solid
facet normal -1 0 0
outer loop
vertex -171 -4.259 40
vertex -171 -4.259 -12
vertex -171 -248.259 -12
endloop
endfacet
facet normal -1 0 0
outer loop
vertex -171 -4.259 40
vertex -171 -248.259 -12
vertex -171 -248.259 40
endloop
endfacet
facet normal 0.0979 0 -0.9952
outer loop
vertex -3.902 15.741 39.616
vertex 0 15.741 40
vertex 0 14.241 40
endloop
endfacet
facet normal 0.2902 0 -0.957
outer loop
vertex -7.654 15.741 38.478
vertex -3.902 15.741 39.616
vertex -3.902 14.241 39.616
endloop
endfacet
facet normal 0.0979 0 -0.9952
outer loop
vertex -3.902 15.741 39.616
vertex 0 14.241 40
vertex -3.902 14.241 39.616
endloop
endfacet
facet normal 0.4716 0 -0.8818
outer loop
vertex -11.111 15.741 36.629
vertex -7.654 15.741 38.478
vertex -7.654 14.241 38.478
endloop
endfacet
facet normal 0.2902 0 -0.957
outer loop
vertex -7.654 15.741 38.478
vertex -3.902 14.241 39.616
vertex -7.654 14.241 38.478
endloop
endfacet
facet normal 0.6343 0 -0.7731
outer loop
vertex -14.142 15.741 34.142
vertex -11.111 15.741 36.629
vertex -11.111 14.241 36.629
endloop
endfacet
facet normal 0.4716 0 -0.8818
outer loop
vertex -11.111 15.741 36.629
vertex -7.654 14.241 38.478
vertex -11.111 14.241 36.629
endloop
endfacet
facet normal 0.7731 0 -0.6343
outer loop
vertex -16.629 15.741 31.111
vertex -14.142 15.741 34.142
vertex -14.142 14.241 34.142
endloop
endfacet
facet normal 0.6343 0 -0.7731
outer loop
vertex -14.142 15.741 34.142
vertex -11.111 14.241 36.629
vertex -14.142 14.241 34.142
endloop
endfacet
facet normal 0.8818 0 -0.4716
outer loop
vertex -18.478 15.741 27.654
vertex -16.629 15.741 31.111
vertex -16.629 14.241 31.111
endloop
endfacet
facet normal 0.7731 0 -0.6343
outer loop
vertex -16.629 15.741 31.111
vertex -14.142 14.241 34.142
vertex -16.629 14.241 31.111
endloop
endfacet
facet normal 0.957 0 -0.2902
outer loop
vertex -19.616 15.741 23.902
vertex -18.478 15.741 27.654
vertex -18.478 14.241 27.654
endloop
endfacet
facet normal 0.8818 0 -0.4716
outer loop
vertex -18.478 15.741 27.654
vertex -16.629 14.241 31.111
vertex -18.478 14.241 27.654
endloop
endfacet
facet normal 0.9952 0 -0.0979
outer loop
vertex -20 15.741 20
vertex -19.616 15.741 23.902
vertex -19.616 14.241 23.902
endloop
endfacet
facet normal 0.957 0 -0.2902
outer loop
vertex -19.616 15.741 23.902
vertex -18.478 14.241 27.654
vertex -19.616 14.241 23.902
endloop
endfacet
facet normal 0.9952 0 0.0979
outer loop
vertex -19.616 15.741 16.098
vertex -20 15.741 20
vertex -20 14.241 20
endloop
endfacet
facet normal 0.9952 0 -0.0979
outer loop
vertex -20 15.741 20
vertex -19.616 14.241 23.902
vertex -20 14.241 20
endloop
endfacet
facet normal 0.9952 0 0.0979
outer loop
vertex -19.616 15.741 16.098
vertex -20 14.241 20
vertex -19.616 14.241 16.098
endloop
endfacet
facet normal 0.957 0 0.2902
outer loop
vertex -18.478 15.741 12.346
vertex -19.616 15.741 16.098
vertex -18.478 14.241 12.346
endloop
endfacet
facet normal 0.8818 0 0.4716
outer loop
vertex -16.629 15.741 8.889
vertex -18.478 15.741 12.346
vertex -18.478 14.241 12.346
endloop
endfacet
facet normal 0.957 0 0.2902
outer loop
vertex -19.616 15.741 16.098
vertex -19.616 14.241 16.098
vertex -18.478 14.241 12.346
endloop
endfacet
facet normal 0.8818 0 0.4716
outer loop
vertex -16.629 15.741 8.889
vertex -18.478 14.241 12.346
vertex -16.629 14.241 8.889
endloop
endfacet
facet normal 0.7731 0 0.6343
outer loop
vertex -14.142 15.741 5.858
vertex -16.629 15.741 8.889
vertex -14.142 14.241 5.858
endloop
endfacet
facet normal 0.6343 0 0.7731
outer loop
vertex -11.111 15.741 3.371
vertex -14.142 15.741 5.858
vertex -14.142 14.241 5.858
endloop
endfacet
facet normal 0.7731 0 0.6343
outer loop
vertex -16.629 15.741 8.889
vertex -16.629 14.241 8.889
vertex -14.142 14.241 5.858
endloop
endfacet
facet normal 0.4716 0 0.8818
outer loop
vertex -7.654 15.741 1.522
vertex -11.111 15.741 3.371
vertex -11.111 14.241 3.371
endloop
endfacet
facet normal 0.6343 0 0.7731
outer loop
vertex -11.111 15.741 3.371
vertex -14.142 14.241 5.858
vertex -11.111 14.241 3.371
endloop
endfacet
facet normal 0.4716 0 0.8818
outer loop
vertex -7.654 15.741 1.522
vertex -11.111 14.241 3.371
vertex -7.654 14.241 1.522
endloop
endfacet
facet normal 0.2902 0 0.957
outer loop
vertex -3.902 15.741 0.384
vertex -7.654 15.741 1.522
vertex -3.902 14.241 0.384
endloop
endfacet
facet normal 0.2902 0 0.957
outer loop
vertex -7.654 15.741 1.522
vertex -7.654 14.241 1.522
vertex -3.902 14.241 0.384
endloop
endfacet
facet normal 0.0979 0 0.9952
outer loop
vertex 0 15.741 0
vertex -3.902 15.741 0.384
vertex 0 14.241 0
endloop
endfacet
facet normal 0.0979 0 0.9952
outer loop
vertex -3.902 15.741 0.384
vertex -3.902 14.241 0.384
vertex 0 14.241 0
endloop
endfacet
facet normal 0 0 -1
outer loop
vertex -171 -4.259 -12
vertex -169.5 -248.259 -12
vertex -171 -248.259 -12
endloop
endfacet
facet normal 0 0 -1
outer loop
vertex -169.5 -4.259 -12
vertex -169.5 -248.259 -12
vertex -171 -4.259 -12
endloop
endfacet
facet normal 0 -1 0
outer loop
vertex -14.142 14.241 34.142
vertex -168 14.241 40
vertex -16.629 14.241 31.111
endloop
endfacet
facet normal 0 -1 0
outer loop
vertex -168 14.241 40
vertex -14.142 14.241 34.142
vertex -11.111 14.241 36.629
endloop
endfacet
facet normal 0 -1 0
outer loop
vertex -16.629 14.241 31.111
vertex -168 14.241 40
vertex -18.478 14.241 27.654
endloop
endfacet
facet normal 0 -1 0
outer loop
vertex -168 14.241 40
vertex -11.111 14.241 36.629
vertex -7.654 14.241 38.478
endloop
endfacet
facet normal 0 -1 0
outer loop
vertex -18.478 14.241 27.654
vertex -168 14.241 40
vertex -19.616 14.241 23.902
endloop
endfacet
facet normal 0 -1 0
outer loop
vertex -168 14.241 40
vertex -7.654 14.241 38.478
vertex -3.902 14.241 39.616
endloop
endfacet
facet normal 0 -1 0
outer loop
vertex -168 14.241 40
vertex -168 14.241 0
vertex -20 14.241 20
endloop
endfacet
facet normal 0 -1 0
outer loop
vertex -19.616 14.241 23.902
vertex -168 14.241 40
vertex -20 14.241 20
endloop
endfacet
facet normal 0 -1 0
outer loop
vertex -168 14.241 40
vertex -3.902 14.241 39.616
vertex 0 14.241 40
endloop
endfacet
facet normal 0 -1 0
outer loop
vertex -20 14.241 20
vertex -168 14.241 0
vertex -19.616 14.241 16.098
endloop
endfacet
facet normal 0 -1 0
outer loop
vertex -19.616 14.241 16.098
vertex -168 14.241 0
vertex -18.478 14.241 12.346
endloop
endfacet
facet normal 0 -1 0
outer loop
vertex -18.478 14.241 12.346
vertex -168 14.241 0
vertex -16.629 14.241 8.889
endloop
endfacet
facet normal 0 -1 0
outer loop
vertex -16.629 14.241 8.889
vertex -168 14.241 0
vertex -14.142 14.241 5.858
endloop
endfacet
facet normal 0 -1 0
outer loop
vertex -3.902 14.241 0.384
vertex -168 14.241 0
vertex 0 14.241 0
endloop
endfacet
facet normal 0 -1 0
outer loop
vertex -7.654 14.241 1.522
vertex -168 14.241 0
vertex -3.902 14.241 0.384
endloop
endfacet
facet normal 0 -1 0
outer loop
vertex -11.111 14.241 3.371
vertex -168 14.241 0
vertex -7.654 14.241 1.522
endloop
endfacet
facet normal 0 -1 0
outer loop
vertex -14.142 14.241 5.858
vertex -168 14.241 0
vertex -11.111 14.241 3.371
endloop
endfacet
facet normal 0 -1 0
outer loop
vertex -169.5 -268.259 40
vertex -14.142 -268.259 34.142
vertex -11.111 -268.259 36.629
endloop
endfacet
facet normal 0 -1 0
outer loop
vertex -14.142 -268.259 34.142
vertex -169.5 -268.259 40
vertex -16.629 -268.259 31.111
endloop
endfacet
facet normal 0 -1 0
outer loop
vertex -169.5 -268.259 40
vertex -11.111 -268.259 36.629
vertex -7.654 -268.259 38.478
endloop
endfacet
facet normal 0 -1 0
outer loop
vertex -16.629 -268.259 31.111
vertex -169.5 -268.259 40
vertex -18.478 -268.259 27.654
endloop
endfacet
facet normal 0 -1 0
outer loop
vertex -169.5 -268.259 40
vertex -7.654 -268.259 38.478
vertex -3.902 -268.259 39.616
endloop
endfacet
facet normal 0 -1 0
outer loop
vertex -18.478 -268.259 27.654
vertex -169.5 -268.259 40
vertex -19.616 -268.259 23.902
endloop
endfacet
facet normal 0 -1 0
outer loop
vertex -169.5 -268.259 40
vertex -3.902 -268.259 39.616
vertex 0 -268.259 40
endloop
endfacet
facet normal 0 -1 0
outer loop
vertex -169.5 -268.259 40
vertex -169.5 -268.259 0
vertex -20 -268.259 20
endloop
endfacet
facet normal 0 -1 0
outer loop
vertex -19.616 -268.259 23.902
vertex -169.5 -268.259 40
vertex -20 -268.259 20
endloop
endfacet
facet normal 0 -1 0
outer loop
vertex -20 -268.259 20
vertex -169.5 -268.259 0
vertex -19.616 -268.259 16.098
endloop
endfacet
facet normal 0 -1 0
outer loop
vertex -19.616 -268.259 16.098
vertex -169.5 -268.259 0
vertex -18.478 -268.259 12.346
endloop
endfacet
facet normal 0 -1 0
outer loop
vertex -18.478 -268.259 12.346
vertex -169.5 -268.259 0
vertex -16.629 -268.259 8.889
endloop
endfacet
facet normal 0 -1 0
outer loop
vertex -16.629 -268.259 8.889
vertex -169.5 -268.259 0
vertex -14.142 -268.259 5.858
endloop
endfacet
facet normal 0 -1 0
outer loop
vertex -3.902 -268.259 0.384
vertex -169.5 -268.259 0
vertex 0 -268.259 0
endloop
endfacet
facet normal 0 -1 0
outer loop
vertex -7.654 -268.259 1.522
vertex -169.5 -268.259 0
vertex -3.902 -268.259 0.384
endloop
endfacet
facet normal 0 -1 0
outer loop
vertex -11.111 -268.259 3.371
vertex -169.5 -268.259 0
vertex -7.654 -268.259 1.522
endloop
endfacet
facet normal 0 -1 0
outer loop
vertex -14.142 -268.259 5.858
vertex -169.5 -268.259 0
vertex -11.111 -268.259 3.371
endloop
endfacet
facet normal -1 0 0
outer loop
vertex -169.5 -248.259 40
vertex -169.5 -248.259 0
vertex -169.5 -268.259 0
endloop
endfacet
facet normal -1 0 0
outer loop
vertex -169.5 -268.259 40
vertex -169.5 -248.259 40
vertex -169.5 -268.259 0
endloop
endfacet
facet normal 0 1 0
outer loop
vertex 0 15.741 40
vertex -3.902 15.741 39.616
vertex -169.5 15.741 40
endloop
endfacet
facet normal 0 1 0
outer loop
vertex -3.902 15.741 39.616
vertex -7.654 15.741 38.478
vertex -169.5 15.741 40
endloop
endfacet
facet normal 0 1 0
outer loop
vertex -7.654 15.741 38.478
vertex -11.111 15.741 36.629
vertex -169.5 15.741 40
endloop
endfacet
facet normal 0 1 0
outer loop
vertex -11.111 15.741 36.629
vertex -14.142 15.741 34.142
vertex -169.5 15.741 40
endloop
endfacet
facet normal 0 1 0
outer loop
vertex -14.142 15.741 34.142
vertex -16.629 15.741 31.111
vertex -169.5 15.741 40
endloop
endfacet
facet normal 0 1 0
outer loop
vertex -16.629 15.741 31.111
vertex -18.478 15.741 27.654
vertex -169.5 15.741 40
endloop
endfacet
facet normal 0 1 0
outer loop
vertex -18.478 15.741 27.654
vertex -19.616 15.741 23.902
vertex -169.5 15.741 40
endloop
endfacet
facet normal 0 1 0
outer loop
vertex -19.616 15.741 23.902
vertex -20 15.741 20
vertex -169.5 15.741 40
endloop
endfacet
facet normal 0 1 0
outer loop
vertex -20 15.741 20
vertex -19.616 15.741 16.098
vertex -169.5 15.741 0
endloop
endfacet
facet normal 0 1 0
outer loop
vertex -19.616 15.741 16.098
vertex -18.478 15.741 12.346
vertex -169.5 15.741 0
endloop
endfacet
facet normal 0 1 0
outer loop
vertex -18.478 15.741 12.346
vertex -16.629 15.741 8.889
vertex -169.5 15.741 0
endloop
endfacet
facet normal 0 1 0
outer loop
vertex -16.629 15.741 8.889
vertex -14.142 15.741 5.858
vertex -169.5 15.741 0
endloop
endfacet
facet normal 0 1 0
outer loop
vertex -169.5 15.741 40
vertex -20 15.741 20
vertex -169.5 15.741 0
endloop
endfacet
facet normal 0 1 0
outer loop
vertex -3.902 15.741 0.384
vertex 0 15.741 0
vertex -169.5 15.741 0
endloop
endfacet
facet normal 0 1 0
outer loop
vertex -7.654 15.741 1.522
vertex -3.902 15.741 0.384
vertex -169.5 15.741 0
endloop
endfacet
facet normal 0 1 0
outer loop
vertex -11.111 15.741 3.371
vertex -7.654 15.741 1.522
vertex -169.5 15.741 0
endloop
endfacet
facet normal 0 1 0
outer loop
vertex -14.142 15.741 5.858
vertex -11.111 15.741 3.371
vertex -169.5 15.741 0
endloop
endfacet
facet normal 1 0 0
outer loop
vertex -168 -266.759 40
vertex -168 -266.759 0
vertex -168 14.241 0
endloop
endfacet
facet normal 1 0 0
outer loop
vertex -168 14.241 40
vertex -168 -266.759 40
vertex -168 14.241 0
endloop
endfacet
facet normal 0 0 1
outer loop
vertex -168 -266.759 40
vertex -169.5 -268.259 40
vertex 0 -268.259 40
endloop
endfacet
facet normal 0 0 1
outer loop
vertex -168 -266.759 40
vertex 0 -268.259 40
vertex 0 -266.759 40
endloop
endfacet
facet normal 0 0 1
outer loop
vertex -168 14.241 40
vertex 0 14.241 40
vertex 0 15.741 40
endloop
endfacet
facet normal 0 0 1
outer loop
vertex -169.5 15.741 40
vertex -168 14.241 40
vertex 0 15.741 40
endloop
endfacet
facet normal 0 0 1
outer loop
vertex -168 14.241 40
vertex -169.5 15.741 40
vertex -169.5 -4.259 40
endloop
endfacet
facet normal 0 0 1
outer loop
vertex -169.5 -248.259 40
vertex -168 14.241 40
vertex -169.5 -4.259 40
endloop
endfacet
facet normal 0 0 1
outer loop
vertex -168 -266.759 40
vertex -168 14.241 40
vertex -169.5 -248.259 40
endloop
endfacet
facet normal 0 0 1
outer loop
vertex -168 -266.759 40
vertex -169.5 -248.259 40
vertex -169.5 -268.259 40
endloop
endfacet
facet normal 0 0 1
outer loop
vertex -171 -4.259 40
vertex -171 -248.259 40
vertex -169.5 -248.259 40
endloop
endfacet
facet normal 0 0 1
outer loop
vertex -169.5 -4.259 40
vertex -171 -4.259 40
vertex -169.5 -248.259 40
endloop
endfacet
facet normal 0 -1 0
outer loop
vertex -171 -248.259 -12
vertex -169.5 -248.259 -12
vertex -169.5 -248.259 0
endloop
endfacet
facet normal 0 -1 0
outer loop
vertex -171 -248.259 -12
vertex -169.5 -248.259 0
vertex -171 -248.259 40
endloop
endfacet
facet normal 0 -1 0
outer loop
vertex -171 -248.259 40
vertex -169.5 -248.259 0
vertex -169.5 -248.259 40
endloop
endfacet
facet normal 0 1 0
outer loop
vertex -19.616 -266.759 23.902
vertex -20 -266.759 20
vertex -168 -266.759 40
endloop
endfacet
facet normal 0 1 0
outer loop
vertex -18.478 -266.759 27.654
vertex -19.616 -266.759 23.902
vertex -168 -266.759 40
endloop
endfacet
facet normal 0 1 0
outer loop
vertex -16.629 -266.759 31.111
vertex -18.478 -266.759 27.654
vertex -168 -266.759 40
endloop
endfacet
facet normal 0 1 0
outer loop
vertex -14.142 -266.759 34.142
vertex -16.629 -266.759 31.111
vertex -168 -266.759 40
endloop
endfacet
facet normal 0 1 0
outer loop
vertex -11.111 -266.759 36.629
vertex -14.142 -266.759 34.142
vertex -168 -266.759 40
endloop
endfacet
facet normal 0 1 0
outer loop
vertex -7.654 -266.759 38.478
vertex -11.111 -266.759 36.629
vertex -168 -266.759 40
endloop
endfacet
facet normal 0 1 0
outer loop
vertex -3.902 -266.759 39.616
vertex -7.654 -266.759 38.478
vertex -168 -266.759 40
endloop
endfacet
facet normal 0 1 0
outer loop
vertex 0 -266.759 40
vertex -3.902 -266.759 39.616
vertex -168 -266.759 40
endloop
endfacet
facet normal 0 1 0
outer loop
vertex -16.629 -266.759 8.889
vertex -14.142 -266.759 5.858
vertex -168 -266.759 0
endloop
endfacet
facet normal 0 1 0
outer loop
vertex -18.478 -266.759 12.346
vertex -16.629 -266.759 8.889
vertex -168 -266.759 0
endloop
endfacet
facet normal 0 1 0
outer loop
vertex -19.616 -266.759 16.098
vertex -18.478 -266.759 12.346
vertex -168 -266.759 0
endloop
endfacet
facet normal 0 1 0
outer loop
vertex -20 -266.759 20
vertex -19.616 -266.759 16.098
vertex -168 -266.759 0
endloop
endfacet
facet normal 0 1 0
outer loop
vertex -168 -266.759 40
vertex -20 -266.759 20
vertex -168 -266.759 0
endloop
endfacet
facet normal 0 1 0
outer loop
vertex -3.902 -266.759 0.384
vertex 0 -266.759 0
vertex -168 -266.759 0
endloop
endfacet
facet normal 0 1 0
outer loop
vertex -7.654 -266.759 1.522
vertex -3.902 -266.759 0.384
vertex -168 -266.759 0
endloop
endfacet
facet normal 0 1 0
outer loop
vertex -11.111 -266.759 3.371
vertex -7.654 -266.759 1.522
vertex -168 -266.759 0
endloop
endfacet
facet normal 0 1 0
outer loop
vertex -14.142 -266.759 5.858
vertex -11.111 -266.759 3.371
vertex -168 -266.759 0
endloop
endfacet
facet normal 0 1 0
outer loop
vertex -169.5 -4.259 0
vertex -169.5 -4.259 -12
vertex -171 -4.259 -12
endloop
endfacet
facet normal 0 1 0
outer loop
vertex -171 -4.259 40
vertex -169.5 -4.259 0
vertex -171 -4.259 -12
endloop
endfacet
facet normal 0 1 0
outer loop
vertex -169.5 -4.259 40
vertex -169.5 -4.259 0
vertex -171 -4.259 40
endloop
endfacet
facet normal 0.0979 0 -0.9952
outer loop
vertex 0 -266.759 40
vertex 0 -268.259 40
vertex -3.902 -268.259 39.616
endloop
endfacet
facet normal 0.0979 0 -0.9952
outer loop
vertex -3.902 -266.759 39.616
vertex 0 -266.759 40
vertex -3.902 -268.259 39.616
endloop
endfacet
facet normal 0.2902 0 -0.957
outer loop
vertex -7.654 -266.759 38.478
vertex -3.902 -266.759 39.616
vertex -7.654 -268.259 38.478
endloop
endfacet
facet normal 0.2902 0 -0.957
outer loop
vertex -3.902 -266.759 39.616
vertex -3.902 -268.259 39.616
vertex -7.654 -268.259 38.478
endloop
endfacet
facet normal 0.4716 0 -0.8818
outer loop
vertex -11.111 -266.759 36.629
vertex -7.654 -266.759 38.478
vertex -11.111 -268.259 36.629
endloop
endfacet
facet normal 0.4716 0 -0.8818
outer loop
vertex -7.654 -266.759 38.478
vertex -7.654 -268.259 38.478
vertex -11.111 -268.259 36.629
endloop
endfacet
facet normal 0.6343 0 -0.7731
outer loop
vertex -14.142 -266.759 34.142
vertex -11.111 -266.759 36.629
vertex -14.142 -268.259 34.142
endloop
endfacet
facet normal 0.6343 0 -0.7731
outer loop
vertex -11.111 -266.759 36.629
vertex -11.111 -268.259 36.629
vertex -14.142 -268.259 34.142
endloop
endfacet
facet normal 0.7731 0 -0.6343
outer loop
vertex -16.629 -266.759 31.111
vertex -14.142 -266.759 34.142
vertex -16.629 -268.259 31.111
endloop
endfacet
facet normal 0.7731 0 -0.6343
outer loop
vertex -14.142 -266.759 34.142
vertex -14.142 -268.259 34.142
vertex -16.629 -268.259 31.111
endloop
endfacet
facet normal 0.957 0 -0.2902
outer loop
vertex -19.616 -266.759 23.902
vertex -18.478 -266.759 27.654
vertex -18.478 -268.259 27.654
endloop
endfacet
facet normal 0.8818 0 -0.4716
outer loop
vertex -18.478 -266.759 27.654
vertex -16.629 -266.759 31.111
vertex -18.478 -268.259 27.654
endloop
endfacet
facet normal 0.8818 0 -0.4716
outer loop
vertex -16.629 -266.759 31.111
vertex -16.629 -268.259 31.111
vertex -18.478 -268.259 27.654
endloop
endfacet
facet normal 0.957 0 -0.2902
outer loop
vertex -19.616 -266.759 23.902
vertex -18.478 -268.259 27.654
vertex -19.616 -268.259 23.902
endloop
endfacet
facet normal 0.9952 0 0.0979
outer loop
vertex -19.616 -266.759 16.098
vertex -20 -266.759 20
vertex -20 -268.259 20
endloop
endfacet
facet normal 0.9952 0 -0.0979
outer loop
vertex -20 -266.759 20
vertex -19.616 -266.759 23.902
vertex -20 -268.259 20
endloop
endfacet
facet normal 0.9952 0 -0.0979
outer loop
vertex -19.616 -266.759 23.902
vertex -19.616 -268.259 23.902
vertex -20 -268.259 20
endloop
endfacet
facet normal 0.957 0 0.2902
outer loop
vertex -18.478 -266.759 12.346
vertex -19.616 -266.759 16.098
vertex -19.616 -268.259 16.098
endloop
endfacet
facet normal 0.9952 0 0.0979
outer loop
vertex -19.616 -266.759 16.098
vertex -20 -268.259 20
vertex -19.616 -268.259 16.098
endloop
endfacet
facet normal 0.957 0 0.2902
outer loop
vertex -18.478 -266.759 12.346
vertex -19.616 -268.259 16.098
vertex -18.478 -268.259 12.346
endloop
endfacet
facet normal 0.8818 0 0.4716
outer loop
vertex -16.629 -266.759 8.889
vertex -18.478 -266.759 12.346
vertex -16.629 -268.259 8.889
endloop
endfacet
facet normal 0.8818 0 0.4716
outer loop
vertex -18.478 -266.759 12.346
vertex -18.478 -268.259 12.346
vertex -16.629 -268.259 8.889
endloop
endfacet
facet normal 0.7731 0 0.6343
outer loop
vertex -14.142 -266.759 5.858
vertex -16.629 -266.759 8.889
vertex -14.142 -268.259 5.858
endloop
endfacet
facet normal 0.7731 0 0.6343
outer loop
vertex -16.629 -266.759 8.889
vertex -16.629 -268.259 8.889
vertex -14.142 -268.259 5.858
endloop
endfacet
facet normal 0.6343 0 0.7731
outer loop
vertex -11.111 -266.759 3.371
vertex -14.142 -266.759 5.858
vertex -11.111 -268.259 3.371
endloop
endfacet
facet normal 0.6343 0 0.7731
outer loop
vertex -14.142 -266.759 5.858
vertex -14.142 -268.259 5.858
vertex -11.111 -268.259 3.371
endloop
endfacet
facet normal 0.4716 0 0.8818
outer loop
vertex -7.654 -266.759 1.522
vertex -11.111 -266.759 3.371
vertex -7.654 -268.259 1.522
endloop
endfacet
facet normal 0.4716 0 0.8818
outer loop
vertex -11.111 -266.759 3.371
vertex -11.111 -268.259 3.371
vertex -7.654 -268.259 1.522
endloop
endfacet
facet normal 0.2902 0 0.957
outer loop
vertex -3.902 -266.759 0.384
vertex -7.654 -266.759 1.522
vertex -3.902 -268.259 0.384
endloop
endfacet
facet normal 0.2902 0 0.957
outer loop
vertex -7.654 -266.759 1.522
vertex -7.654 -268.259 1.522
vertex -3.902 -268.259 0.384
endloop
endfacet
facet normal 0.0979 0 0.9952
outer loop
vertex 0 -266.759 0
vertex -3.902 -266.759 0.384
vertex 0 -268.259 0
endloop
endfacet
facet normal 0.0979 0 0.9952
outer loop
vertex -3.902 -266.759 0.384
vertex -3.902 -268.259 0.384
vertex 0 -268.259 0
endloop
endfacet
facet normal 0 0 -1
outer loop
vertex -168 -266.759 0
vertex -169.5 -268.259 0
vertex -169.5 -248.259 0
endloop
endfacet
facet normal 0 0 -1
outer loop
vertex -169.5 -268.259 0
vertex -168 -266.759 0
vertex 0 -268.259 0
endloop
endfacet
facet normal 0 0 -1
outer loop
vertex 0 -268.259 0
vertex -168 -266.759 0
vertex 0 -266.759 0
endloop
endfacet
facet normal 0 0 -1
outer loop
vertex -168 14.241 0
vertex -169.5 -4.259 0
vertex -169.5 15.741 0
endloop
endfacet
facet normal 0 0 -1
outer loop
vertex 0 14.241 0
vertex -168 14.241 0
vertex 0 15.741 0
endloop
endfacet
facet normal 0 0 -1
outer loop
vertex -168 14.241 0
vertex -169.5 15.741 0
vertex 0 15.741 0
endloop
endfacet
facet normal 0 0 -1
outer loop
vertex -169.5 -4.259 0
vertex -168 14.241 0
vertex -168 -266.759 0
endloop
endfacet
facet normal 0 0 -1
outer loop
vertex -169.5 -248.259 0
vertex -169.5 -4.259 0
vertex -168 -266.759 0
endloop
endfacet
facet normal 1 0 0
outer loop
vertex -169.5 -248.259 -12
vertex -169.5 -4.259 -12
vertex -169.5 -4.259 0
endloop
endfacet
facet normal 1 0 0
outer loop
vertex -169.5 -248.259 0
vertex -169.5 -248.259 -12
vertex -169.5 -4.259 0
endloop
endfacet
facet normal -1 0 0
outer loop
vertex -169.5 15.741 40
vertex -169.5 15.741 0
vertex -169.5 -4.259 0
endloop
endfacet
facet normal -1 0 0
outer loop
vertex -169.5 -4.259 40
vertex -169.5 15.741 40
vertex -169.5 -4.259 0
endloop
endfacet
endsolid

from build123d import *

# Parameters (mm, degrees)
EXTRUDE_1_DEPTH     = 40
SKETCH_2_R          = 20
CUT_EXTRUDE_1_DEPTH = 336
SKETCH_3_W          = 52
SKETCH_3_H          = 244
EXTRUDE_2_DEPTH     = 1.5


with BuildPart() as part:
    # 草图1 → 凸台-拉伸1 (new body)
    with BuildSketch(Plane.XY):
        Polygon((0, 15.741255831), (-169.5, 15.741255831), (-169.5, -268.258744169), (0, -268.258744169), (0, -266.758744169), (-168, -266.758744169), (-168, 14.241255831), (0, 14.241255831), align=None)
    extrude(amount=EXTRUDE_1_DEPTH)

    # 草图2 → 切除-拉伸1 (cut)
    with BuildSketch(Plane(origin=(0, -268.258744169, 0), x_dir=(-1, 0, 0), z_dir=(0, -1, 0))):
        with Locations((0, -20)):
            Circle(SKETCH_2_R)
    extrude(amount=-CUT_EXTRUDE_1_DEPTH, mode=Mode.SUBTRACT)

    # 草图3 → 凸台-拉伸2 (add)
    with BuildSketch(Plane.ZY.offset(169.5)):
        with Locations((14, -126.258744169)):
            Rectangle(SKETCH_3_W, SKETCH_3_H)
    extrude(amount=EXTRUDE_2_DEPTH)


solid = part.part
